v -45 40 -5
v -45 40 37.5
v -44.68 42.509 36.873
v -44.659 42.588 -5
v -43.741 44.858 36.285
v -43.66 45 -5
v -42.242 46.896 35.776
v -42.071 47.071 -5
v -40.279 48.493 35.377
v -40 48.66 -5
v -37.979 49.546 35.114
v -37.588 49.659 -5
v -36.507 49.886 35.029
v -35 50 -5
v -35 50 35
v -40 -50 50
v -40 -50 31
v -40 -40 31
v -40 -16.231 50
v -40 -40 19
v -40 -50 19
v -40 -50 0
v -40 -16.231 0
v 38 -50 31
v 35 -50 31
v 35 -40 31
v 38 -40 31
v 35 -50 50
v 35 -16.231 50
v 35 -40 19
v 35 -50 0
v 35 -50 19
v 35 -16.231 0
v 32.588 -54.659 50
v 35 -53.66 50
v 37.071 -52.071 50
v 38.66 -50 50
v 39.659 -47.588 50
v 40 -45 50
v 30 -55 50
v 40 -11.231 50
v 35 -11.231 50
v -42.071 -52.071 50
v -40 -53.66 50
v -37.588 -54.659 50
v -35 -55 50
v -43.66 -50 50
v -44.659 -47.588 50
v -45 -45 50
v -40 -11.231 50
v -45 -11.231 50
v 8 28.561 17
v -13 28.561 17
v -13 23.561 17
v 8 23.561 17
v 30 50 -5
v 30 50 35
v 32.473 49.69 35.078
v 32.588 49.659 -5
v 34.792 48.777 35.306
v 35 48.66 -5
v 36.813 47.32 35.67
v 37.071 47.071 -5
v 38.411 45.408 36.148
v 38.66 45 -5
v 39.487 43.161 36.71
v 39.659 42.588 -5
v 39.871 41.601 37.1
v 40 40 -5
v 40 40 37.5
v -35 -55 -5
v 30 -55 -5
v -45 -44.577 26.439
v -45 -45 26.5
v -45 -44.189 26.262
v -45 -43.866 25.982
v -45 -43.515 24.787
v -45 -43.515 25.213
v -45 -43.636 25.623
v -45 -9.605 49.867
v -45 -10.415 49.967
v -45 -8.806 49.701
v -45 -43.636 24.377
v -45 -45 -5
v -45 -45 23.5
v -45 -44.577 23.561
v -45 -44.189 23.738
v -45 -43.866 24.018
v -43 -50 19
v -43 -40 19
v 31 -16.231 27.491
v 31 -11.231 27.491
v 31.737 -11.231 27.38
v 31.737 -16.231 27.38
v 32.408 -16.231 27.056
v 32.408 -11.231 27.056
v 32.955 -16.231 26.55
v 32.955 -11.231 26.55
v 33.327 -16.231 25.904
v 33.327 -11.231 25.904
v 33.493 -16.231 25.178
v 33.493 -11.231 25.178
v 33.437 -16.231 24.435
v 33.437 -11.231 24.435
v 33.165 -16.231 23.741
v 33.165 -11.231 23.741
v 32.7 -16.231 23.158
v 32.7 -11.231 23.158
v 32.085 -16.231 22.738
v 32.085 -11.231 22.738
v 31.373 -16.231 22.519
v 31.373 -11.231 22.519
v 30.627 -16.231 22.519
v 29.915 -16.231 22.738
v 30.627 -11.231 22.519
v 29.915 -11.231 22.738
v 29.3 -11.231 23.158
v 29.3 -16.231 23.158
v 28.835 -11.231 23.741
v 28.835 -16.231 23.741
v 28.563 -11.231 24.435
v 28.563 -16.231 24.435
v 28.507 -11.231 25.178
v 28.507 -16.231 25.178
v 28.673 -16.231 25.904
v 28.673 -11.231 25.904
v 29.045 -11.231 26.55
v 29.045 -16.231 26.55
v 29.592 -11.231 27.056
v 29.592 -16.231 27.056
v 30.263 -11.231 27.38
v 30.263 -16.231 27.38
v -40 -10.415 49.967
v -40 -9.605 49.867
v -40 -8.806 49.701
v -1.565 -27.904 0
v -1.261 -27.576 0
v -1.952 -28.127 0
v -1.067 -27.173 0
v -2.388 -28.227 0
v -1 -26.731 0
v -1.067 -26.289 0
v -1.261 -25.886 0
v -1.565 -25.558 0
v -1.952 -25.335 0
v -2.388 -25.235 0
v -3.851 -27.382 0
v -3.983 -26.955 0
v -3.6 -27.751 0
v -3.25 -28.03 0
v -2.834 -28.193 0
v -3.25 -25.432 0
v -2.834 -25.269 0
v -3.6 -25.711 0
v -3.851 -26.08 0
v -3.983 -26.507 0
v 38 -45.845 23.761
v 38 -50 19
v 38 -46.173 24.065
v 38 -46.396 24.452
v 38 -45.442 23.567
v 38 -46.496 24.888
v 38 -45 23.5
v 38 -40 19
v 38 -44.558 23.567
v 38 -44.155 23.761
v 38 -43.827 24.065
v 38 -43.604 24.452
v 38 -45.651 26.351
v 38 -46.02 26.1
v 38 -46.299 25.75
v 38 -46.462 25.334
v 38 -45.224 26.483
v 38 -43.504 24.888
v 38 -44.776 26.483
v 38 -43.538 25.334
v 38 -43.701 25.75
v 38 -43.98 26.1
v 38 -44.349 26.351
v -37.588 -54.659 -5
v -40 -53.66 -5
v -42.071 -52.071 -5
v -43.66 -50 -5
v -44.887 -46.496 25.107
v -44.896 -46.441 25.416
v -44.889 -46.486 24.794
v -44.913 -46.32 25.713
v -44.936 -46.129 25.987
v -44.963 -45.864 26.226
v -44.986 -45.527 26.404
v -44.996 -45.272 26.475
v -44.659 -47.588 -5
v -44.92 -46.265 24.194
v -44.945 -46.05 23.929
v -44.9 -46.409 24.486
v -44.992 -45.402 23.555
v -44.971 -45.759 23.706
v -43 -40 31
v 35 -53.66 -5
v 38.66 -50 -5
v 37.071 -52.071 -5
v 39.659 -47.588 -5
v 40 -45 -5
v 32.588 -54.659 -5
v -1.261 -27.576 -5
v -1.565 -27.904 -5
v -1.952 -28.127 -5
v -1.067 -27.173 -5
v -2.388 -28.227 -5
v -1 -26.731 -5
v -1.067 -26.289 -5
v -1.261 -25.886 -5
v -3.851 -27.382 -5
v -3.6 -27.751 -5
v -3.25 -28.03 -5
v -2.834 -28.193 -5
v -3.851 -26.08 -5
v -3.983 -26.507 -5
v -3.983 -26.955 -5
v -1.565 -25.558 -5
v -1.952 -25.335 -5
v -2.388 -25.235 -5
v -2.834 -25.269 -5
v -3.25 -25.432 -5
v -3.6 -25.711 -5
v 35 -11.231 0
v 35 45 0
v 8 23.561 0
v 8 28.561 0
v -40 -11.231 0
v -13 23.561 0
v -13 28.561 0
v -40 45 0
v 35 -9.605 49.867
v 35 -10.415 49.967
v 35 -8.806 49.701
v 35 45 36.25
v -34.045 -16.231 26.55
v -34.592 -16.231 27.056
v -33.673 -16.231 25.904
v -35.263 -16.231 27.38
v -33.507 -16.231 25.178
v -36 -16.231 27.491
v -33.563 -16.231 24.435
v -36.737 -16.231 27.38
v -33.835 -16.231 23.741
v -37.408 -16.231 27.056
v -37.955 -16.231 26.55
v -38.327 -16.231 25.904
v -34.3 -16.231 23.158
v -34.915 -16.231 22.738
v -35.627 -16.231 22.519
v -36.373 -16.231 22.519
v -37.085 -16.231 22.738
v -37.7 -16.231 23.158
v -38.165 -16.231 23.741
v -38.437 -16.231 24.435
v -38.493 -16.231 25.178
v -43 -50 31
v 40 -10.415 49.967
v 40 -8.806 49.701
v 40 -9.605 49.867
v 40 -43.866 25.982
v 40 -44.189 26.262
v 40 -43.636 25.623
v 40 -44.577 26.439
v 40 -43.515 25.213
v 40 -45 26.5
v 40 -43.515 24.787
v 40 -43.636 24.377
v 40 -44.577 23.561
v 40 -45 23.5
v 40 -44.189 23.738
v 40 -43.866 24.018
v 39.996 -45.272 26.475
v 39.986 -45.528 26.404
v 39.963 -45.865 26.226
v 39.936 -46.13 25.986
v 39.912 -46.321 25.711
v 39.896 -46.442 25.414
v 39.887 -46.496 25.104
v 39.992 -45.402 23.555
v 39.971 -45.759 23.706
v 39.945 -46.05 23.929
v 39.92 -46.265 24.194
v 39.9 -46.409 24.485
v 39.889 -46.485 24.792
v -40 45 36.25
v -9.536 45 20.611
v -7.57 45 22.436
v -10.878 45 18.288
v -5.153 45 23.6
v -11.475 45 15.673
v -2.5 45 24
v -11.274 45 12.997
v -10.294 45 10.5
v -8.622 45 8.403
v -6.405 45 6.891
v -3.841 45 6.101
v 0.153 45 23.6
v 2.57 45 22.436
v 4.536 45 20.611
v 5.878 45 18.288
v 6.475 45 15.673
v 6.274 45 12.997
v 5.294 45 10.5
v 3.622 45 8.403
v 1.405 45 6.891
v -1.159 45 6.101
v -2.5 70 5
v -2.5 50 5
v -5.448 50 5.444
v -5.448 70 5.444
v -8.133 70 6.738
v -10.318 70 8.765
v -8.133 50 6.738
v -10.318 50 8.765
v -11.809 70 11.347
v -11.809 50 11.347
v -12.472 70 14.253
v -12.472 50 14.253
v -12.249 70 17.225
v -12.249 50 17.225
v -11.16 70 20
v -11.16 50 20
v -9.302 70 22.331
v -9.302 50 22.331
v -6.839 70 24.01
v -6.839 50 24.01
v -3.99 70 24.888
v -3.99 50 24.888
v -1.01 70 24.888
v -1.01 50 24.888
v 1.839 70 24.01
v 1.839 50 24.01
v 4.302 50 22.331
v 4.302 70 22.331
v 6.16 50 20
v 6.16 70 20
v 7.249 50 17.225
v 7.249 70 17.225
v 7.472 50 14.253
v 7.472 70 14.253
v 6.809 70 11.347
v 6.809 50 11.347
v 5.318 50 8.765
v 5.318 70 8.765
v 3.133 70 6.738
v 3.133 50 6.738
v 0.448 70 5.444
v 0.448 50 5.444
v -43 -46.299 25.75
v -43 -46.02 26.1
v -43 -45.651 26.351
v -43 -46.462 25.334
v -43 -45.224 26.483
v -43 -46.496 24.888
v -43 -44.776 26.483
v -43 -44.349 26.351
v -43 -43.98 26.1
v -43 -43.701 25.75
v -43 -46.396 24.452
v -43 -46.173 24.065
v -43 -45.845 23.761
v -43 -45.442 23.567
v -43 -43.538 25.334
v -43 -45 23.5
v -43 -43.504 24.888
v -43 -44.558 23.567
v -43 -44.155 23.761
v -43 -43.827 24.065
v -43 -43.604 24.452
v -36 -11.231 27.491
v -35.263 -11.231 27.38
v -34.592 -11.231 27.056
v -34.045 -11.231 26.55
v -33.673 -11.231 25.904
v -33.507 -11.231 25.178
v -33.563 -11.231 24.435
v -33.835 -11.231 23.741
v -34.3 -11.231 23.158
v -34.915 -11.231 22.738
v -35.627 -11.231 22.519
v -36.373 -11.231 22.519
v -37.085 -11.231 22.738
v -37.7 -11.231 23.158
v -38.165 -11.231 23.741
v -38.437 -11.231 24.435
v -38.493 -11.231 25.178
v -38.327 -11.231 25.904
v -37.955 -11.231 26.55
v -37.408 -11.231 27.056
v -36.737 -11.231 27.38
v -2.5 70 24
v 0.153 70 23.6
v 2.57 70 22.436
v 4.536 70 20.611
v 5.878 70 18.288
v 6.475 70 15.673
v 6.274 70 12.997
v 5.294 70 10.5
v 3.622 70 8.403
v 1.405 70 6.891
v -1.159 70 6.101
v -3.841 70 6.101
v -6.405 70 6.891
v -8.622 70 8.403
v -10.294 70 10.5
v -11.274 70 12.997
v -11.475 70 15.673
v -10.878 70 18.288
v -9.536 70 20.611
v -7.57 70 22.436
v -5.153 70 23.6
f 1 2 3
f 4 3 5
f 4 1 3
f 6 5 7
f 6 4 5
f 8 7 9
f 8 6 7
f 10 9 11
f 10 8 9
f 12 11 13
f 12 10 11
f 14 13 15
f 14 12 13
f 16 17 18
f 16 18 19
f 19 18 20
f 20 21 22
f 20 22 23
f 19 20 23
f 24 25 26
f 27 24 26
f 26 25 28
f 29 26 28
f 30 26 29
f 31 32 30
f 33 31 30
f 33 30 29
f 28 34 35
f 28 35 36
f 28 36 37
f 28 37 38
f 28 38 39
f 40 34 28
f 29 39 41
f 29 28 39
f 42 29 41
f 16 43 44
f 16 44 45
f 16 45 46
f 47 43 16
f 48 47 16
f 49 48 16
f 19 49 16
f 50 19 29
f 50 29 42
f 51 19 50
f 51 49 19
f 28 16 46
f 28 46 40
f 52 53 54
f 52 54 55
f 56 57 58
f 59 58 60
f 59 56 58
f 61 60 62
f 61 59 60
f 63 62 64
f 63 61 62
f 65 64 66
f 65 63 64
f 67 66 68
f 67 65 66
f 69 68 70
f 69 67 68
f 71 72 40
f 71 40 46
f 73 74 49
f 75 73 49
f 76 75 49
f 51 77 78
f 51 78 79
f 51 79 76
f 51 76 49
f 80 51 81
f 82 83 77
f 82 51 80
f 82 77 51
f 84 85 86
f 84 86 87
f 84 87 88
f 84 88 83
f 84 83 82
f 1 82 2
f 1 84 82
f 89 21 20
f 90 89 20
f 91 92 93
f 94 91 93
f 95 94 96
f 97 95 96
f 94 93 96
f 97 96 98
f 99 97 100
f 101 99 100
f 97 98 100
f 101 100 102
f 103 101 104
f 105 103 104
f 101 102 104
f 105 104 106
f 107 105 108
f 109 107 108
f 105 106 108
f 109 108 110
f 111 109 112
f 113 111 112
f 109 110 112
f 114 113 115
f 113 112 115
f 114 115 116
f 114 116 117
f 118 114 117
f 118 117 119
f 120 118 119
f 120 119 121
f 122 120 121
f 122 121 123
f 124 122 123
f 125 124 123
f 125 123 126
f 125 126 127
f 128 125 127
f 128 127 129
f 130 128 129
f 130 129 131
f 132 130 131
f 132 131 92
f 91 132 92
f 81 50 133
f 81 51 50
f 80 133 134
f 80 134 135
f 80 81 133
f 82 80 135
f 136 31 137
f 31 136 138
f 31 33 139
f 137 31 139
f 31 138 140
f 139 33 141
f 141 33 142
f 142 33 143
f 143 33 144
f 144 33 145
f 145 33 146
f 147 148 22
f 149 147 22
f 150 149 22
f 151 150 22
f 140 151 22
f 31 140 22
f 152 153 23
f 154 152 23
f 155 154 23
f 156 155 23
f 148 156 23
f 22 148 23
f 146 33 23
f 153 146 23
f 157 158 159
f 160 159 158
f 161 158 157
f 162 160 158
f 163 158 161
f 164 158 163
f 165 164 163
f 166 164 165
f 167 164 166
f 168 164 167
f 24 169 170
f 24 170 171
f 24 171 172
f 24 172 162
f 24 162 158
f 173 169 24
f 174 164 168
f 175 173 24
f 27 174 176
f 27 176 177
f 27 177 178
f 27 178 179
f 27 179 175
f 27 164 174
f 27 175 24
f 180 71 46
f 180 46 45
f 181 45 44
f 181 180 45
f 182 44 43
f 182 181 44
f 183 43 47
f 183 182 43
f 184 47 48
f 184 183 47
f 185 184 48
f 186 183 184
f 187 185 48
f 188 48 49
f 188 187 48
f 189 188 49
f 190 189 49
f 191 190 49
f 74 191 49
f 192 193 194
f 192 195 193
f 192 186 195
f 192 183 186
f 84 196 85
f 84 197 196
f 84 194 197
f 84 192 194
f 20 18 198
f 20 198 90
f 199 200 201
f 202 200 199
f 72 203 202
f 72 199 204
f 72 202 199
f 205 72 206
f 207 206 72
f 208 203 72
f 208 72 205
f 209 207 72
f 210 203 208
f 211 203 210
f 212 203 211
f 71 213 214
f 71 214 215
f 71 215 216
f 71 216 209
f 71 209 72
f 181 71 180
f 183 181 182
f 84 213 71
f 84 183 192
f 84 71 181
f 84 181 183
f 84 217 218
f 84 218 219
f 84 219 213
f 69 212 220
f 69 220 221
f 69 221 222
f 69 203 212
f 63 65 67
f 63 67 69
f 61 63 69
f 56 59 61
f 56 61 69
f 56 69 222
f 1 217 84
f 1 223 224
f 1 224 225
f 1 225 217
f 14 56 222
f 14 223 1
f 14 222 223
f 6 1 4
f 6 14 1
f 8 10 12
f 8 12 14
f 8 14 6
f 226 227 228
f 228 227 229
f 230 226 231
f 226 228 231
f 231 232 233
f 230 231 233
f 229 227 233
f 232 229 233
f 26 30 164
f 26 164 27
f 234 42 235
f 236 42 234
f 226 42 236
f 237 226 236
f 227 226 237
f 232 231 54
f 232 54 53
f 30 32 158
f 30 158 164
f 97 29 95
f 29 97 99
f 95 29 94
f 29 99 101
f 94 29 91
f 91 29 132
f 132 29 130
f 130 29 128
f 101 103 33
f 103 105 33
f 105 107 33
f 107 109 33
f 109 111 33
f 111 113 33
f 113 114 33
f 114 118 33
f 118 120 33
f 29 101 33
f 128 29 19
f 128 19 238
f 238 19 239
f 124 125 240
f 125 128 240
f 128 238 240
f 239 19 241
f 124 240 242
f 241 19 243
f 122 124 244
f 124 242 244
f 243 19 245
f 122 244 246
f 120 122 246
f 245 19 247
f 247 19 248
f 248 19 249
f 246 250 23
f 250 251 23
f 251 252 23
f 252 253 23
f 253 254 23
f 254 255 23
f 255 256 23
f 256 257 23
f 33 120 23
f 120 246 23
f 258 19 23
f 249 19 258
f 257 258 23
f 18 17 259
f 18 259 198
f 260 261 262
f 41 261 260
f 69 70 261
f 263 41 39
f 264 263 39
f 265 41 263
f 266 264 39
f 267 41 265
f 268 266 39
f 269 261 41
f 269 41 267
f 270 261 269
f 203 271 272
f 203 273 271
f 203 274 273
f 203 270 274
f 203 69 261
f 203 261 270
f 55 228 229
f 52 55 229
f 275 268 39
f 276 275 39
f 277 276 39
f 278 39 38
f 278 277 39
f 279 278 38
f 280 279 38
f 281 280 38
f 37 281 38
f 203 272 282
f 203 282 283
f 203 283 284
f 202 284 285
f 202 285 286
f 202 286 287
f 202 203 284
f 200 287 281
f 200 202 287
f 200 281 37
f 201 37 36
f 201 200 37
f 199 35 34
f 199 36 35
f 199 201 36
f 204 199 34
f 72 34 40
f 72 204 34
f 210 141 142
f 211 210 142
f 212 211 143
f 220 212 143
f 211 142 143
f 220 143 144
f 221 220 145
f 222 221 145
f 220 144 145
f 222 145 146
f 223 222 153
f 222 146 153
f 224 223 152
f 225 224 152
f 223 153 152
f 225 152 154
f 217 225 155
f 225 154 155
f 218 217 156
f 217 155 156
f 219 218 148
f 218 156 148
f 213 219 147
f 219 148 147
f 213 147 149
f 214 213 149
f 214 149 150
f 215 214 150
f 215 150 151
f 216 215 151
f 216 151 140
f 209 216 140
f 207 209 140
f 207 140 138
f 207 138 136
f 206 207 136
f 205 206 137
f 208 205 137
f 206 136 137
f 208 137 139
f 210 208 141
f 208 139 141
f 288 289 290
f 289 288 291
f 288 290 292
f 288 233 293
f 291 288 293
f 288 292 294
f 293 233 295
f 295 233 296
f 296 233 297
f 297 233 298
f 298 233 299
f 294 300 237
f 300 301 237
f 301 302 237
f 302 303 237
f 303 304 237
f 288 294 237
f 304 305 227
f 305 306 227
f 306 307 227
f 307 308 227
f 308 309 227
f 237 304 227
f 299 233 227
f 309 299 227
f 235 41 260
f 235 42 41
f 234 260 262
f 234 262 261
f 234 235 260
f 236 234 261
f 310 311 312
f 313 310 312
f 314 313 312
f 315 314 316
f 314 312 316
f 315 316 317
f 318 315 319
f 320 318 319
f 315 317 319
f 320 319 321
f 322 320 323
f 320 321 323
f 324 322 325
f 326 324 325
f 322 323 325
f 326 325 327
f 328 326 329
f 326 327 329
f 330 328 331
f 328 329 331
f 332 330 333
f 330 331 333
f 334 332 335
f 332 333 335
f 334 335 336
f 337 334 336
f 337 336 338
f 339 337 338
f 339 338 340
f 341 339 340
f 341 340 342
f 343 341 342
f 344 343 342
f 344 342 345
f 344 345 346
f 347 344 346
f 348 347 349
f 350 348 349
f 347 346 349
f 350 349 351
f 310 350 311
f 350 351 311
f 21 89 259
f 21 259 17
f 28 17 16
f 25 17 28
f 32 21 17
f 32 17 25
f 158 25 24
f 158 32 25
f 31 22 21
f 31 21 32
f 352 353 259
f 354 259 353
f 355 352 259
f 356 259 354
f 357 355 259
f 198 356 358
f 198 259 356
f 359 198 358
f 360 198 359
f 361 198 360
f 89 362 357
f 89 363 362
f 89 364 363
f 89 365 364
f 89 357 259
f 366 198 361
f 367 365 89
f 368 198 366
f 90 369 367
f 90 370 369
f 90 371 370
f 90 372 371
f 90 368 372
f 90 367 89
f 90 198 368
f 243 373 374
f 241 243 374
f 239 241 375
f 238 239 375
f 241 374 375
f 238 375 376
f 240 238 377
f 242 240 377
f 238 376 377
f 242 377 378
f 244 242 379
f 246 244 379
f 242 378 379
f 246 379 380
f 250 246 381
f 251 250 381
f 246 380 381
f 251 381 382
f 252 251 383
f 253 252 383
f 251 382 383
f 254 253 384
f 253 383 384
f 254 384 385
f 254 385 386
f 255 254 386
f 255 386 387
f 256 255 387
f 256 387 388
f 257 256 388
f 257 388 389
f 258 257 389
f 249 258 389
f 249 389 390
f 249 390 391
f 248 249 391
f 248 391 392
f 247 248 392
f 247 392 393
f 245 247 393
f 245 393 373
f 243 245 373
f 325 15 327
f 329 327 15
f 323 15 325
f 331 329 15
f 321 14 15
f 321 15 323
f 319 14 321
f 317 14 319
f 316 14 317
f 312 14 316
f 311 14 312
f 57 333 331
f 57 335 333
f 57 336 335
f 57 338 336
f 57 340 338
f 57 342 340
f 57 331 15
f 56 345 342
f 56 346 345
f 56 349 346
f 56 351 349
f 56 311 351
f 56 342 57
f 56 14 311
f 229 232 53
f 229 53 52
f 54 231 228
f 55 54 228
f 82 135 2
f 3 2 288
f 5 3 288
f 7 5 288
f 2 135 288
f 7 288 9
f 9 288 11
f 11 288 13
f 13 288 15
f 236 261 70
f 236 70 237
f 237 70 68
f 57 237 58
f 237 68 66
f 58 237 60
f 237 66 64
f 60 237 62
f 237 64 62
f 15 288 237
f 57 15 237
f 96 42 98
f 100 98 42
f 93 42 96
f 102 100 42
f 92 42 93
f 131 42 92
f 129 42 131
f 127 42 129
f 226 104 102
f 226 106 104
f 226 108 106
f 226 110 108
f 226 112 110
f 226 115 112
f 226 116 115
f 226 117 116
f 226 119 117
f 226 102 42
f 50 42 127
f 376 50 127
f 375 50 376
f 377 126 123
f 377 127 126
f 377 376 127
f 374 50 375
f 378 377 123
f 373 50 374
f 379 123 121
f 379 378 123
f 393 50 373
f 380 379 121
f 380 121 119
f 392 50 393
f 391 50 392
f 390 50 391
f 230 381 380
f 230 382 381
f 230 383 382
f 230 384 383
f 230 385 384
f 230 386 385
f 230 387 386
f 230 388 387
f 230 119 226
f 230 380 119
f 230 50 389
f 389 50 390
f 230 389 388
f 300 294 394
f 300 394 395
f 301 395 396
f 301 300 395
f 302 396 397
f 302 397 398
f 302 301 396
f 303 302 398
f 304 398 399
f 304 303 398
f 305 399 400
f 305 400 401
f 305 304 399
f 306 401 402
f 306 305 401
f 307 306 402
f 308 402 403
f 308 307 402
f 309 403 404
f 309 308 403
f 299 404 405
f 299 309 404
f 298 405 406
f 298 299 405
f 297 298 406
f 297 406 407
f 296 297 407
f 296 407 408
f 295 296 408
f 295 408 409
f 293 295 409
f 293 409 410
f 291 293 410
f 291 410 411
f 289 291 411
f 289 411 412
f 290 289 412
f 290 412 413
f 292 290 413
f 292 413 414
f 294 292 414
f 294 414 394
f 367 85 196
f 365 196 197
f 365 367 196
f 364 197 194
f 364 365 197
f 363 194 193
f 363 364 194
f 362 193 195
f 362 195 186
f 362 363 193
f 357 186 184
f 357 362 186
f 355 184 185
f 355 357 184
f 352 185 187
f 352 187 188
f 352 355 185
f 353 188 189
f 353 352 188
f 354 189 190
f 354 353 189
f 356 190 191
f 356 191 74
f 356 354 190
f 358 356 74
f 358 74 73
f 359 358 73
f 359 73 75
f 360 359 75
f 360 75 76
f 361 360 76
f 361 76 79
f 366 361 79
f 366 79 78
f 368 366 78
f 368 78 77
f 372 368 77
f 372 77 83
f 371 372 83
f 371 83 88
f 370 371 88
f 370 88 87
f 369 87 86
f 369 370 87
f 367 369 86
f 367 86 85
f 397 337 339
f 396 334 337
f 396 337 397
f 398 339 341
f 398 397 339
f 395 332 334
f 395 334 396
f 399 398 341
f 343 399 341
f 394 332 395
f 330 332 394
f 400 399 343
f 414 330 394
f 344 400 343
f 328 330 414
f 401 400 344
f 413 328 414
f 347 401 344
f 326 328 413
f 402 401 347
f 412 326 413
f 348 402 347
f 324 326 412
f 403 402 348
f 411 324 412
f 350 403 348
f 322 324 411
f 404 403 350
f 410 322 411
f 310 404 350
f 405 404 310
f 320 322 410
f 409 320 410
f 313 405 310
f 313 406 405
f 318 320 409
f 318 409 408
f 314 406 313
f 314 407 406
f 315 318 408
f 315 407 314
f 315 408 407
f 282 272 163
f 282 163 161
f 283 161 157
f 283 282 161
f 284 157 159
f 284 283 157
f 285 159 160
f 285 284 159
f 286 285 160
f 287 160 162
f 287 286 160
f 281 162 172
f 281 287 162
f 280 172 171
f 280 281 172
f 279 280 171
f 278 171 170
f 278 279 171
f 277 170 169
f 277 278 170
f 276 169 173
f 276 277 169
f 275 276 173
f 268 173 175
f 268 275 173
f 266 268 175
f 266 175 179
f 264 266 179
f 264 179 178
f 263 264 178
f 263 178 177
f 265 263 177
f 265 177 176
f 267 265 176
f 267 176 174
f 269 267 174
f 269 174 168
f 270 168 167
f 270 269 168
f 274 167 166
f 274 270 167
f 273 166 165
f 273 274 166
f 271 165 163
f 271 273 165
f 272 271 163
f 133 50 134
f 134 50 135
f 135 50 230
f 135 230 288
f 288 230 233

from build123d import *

# Parameters (mm, degrees)
SKETCH1_W               = 75
SKETCH1_H               = 95
BOSS_EXTRUDE4_DEPTH     = 50
BOSS_EXTRUDE5_START     = 5
BOSS_EXTRUDE5_DEPTH     = 5
CUT_EXTRUDE4_DEPTH      = 110.201648339
CUT_EXTRUDE4_DEPTH_BACK = 110.201648339
SKETCH7_R               = 1.5
SKETCH10_W              = 12
SKETCH10_H              = 10
CUT_EXTRUDE5_DEPTH      = 3
SKETCH11_W              = 12
SKETCH11_H              = 10
CUT_EXTRUDE6_DEPTH      = 3
CUT_EXTRUDE7_DEPTH      = 113.915898075
FILLET11_R              = 10
SKETCH13_W              = 50
SKETCH13_H              = 5
BOSS_EXTRUDE7_DEPTH     = 75
SKETCH17_R              = 1.5
CUT_EXTRUDE9_DEPTH      = 5
SKETCH18_W              = 21
SKETCH18_H              = 5
BOSS_EXTRUDE8_DEPTH     = 17
SKETCH21_R              = 2.5
CUT_EXTRUDE10_DEPTH     = 17
SKETCH22_R              = 10
SKETCH22_R_2            = 9
BOSS_EXTRUDE9_DEPTH     = 20
CUT_EXTRUDE11_START     = -5
SKETCH24_R              = 9
CUT_EXTRUDE11_DEPTH     = 5


with BuildPart() as part:
    # Sketch1 → Boss-Extrude4 (new body)
    with BuildSketch(Plane.XY):
        with BuildLine():
            Line((-35, -55), (30, -55))
            ThreePointArc((30, -55), (37.071067812, -52.071067812), (40, -45))
            Line((40, -45), (40, 40))
            ThreePointArc((40, 40), (37.071067812, 47.071067812), (30, 50))
            Line((30, 50), (-35, 50))
            ThreePointArc((-35, 50), (-42.071067812, 47.071067812), (-45, 40))
            Line((-45, 40), (-45, -45))
            ThreePointArc((-45, -45), (-42.071067812, -52.071067812), (-35, -55))
        make_face()
        with Locations((-2.5, -2.5)):
            Rectangle(SKETCH1_W, SKETCH1_H, mode=Mode.SUBTRACT)
    extrude(amount=BOSS_EXTRUDE4_DEPTH)

    # Sketch5 → Boss-Extrude5 (add)
    with BuildSketch(Plane(origin=(0, 0, 0), x_dir=(-1, 0, 0), z_dir=(0, 0, -1)).offset(BOSS_EXTRUDE5_START)):
        with BuildLine():
            Line((-30, -55), (35, -55))
            ThreePointArc((35, -55), (42.071067812, -52.071067812), (45, -45))
            Line((45, -45), (45, 40))
            ThreePointArc((45, 40), (42.071067812, 47.071067812), (35, 50))
            Line((35, 50), (-30, 50))
            ThreePointArc((-30, 50), (-37.071067812, 47.071067812), (-40, 40))
            Line((-40, 40), (-40, -45))
            ThreePointArc((-40, -45), (-37.071067812, -52.071067812), (-30, -55))
        make_face()
    extrude(amount=-BOSS_EXTRUDE5_DEPTH)

    # Sketch7 → Cut-Extrude4 (cut, two sides: drawn at the far end of the back side and taken through both)
    with BuildSketch(Plane.ZY.offset(-35).offset(-CUT_EXTRUDE4_DEPTH_BACK)):
        with Locations(Location((25, -45, 0), (0, 0, 180))):
            Circle(SKETCH7_R)
    extrude(amount=CUT_EXTRUDE4_DEPTH + CUT_EXTRUDE4_DEPTH_BACK, mode=Mode.SUBTRACT)

    # Sketch10 → Cut-Extrude5 (cut)
    with BuildSketch(Plane.ZY.offset(-35)):
        with Locations((25, -45)):
            Rectangle(SKETCH10_W, SKETCH10_H)
    extrude(amount=-CUT_EXTRUDE5_DEPTH, mode=Mode.SUBTRACT)

    # Sketch11 → Cut-Extrude6 (cut)
    with BuildSketch(Plane(origin=(-40, 0, 0), x_dir=(0, 0, -1), z_dir=(1, 0, 0))):
        with Locations((-25, -45)):
            Rectangle(SKETCH11_W, SKETCH11_H)
    extrude(amount=-CUT_EXTRUDE6_DEPTH, mode=Mode.SUBTRACT)

    # Sketch12 → Cut-Extrude7 (cut, through all)
    with BuildSketch(Plane(origin=(40, 0, 0), x_dir=(0, 0, -1), z_dir=(1, 0, 0))):
        Polygon((-50, -10), (-35, 50), (-50, 50), align=None)
    extrude(amount=-CUT_EXTRUDE7_DEPTH, mode=Mode.SUBTRACT)

    # Fillet11
    fillet11_edges = [part.edges().sort_by_distance(p)[0] for p in [
        (-42.5, -10, 50),
        (37.5, -10, 50),
    ]]
    fillet(fillet11_edges, radius=FILLET11_R)

    # Sketch13 → Boss-Extrude7 (add)
    with BuildSketch(Plane(origin=(-40, 0, 0), x_dir=(0, 0, -1), z_dir=(1, 0, 0))):
        with Locations((-25, -13.731056256)):
            Rectangle(SKETCH13_W, SKETCH13_H)
    extrude(amount=BOSS_EXTRUDE7_DEPTH)

    # Sketch17 → Cut-Extrude9 (cut)
    with BuildSketch(Plane.XY):
        with Locations((-2.5, -26.731056256)):
            Circle(SKETCH17_R)
    extrude(amount=-CUT_EXTRUDE9_DEPTH, mode=Mode.SUBTRACT)

    # Sketch18 → Boss-Extrude8 (add)
    with BuildSketch(Plane.XY):
        with Locations((-2.5, 26.060865593)):
            Rectangle(SKETCH18_W, SKETCH18_H)
    extrude(amount=BOSS_EXTRUDE8_DEPTH)

    # Sketch21 → Cut-Extrude10 (cut)
    with BuildSketch(Plane(origin=(0, -11.231056256, 0), x_dir=(1, 0, 0), z_dir=(0, 1, 0))):
        with Locations(Location((-36, -24.990851146, 0), (0, 0, 270))):
            Circle(SKETCH21_R)
        with Locations(Location((31, -24.990851146, 0), (0, 0, 270))):
            Circle(SKETCH21_R)
    extrude(amount=-CUT_EXTRUDE10_DEPTH, mode=Mode.SUBTRACT)

    # Sketch22 → Boss-Extrude9 (add)
    with BuildSketch(Plane(origin=(0, 50, 0), x_dir=(1, 0, 0), z_dir=(0, 1, 0))):
        with Locations(Location((-2.5, -15, 0), (0, 0, 90))):
            Circle(SKETCH22_R)
        with Locations(Location((-2.5, -15, 0), (0, 0, 270))):
            Circle(SKETCH22_R_2, mode=Mode.SUBTRACT)
    extrude(amount=BOSS_EXTRUDE9_DEPTH)

    # Sketch24 → Cut-Extrude11 (cut)
    with BuildSketch(Plane(origin=(0, 50, 0), x_dir=(1, 0, 0), z_dir=(0, 1, 0)).offset(CUT_EXTRUDE11_START)):
        with Locations(Location((-2.5, -15, 0), (0, 0, 270))):
            Circle(SKETCH24_R)
    extrude(amount=CUT_EXTRUDE11_DEPTH, mode=Mode.SUBTRACT)


solid = part.part
